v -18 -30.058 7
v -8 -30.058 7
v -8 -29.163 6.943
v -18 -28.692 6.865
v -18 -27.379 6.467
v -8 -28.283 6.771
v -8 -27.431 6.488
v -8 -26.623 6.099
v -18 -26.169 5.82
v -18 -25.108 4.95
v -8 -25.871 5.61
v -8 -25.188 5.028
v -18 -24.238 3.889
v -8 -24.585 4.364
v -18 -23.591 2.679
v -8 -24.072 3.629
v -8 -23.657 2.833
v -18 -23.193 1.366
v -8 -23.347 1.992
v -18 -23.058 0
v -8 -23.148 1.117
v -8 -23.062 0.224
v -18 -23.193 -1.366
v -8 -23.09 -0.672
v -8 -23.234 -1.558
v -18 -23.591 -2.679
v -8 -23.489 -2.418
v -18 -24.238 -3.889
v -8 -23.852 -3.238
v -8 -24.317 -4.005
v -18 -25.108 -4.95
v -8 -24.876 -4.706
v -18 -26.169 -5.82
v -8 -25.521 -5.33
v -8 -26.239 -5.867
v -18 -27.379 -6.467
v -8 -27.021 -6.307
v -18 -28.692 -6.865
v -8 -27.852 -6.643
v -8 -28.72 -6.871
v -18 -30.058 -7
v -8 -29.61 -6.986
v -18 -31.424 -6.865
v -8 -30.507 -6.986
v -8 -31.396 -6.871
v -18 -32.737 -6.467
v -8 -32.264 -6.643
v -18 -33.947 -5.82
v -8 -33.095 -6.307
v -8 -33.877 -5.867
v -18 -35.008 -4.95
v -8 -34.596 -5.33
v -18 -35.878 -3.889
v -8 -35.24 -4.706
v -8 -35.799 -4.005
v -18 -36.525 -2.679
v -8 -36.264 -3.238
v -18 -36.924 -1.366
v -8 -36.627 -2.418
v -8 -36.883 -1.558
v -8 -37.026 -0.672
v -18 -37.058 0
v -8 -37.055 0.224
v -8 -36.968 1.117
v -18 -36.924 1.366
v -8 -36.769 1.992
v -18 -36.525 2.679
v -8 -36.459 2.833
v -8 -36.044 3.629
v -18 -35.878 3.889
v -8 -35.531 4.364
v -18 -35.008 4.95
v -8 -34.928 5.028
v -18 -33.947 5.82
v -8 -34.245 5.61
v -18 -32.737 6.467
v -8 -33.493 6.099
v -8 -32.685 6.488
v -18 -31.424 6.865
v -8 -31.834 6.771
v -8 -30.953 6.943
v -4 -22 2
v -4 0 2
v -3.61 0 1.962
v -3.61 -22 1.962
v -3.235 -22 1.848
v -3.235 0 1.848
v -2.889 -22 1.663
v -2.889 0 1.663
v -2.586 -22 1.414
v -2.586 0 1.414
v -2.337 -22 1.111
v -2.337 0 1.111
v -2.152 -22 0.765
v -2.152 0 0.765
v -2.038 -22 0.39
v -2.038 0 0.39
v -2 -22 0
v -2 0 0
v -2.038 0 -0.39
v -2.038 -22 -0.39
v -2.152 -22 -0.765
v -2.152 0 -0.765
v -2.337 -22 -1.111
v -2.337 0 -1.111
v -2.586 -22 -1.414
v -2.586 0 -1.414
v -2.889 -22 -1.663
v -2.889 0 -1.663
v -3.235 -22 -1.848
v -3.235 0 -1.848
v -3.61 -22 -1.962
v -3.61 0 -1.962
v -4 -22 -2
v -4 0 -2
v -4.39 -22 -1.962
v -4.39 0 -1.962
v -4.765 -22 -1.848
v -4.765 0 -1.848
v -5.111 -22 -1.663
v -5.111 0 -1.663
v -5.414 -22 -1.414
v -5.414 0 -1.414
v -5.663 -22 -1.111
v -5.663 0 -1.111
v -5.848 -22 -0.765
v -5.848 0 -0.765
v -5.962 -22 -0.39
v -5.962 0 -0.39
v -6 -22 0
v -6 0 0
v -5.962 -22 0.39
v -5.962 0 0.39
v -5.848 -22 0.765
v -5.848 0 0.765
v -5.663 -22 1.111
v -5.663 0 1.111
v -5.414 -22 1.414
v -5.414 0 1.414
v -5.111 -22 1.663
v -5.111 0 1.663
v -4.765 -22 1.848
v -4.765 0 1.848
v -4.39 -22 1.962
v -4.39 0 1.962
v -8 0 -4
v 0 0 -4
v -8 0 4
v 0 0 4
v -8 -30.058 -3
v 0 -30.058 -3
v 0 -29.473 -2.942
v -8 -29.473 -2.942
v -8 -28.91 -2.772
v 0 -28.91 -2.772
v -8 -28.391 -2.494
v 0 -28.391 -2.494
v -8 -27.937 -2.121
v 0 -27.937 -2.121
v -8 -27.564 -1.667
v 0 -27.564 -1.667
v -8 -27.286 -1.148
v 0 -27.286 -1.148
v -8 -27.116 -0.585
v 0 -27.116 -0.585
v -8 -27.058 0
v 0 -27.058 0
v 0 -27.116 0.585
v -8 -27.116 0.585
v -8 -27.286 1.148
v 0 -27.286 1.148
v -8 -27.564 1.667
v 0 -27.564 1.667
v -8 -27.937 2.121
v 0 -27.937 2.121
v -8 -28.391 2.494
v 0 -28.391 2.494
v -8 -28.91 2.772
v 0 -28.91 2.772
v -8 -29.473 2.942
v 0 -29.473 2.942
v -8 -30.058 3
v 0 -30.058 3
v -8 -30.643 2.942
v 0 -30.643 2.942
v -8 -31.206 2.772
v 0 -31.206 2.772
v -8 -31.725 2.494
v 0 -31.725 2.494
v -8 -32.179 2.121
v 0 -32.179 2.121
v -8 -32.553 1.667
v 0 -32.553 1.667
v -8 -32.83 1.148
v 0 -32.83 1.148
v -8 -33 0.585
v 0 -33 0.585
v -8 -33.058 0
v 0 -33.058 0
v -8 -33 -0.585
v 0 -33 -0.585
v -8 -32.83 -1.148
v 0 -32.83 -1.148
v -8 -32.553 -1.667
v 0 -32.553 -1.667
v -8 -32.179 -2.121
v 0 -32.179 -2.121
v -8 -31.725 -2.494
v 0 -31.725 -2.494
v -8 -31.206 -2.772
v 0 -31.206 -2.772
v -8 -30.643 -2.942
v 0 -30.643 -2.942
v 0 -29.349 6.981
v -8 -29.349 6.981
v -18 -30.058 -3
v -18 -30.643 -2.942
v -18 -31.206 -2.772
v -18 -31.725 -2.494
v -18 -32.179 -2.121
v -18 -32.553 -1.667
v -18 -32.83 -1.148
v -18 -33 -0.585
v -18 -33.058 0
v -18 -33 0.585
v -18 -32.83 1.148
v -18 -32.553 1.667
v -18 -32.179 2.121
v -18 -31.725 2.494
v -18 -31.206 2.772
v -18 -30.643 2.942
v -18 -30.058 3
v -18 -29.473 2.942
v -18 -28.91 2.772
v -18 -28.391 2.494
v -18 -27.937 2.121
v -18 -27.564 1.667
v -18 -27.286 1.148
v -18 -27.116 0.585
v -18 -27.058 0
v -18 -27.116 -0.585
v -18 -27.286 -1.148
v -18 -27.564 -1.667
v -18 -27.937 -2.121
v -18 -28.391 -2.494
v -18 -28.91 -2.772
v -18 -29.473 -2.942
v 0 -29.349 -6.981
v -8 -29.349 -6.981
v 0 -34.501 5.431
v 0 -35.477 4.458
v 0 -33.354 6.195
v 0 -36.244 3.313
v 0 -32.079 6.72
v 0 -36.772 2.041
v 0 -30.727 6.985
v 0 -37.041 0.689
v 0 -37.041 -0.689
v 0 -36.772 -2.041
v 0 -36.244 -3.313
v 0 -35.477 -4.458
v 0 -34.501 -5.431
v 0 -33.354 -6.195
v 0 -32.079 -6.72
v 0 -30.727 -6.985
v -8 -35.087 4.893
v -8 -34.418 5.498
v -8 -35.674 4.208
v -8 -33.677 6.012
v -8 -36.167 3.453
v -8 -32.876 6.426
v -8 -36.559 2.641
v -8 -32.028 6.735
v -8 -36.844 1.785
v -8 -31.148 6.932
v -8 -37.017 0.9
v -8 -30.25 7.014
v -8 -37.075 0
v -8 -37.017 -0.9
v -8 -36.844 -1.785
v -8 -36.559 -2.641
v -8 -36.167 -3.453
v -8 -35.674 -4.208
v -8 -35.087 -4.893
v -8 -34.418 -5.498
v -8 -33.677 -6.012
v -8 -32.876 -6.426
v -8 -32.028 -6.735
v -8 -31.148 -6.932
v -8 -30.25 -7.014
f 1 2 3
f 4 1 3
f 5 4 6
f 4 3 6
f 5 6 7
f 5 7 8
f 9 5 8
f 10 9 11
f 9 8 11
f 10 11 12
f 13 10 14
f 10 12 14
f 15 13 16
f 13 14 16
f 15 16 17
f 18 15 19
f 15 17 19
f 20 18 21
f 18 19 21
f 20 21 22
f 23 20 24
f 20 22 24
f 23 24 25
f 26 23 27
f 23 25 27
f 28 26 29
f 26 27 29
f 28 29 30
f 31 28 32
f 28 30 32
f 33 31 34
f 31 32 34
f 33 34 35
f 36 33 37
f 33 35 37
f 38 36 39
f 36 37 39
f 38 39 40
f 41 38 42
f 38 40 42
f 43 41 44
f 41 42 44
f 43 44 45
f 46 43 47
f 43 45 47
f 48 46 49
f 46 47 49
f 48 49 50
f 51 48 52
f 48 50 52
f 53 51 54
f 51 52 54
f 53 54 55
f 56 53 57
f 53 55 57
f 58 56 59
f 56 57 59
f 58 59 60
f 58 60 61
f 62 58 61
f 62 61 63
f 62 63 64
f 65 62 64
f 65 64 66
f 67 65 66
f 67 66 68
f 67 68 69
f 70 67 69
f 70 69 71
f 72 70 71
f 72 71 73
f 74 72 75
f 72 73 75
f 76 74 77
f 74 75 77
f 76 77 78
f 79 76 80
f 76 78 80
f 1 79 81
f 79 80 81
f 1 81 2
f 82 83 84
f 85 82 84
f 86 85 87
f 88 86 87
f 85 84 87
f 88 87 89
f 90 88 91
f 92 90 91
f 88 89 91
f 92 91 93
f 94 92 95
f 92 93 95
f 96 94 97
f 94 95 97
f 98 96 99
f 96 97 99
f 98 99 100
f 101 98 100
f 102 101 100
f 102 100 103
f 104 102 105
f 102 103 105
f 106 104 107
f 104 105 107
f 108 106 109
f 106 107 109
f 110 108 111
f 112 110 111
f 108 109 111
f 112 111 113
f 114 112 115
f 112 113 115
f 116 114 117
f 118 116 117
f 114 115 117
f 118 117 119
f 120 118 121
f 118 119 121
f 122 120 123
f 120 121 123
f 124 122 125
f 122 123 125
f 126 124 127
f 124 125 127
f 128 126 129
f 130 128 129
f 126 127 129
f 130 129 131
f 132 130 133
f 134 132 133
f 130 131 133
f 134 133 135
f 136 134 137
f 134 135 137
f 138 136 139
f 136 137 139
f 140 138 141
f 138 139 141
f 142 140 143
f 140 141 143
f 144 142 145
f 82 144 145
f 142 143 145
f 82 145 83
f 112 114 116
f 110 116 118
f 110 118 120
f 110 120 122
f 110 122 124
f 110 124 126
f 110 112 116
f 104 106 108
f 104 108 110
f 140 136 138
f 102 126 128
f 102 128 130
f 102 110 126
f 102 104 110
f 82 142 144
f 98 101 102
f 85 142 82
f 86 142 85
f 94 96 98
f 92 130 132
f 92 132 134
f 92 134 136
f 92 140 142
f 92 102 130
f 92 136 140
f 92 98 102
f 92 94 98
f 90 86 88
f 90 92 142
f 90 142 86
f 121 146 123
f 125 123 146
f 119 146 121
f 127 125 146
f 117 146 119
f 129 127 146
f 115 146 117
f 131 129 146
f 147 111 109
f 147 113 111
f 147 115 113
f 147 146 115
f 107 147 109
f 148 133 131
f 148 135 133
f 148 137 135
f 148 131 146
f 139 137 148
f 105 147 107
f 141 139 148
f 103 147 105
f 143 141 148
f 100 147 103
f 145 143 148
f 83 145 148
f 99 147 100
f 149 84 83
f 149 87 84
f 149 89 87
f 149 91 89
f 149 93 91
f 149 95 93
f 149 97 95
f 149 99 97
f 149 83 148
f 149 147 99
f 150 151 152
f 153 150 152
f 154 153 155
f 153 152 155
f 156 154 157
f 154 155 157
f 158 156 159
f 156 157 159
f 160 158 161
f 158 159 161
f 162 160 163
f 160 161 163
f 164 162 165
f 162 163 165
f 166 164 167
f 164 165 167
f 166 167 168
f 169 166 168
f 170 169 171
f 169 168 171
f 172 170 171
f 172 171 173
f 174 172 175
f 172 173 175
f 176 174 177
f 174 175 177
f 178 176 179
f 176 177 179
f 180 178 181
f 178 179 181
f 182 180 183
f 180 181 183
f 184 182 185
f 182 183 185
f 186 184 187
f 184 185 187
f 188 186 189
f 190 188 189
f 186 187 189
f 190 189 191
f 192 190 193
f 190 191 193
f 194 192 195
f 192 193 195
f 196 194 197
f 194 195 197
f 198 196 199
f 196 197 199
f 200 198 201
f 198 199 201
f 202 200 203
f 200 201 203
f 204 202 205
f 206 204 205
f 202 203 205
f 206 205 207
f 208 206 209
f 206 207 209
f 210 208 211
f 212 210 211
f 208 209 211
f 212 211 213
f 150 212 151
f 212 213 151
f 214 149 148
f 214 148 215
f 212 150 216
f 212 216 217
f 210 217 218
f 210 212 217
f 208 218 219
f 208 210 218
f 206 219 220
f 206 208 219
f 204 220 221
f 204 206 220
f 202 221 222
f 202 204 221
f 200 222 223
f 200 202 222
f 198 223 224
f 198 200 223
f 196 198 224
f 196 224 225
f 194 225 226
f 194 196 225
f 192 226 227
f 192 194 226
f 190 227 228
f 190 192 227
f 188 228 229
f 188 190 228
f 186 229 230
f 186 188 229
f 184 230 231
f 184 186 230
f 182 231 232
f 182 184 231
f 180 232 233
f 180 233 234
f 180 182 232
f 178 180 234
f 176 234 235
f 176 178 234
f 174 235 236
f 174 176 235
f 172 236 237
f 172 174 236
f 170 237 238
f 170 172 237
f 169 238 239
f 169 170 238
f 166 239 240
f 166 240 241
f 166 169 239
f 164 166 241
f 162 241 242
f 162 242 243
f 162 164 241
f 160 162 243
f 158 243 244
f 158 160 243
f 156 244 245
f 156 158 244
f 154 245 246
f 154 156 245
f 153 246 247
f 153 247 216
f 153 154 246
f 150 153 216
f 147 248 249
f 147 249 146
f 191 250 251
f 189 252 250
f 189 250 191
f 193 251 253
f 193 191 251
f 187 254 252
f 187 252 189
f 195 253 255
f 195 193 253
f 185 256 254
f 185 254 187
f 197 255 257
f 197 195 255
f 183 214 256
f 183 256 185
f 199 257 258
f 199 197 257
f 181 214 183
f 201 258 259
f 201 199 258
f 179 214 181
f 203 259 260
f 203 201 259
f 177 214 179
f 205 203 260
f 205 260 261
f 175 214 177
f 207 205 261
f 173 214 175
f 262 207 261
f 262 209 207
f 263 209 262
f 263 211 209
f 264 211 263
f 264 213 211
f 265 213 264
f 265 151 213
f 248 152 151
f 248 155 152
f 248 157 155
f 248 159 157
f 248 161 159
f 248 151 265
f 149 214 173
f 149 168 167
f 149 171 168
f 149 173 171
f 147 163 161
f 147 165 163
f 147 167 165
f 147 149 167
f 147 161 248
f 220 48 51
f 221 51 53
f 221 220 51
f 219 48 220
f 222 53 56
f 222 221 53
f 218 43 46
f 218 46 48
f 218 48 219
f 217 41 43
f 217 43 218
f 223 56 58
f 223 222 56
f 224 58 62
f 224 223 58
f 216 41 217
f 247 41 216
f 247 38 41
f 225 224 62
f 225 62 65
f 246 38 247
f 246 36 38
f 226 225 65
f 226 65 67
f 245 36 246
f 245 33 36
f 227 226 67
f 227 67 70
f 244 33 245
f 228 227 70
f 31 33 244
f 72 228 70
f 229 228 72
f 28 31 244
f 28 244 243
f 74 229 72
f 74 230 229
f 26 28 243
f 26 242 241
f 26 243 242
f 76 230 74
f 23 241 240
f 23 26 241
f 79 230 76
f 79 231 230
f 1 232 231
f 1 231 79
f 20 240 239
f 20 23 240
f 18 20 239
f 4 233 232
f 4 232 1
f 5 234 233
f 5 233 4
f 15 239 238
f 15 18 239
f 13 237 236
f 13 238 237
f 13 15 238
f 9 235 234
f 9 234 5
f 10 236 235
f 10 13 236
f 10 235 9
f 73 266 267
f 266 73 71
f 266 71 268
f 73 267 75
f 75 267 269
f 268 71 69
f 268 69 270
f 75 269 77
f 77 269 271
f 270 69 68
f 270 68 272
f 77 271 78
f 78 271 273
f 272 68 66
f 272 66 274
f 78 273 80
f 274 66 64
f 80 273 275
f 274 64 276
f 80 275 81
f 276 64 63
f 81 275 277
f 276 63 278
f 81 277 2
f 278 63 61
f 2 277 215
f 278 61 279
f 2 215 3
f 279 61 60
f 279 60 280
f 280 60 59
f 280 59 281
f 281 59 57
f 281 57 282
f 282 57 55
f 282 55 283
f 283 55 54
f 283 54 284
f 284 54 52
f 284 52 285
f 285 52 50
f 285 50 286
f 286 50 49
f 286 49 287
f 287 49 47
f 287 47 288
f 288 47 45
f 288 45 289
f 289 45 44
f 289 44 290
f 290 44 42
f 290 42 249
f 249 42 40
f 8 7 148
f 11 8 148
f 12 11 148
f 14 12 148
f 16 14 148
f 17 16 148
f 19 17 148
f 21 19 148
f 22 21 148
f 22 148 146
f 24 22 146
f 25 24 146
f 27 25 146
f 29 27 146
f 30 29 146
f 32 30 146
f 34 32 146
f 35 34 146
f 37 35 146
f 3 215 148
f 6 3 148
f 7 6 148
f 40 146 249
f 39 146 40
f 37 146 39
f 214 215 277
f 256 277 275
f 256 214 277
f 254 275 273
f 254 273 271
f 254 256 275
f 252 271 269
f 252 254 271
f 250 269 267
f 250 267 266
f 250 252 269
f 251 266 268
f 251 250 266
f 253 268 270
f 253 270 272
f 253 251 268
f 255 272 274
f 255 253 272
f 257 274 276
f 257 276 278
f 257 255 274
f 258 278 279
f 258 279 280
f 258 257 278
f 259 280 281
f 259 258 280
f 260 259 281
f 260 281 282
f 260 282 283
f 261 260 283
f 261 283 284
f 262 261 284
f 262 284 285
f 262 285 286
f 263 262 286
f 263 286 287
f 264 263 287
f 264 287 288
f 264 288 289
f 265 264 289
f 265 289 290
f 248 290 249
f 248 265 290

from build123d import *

# Parameters (mm, degrees)
SKETCH1_R           = 3
BOSS_EXTRUDE1_DEPTH = 8
SKETCH2_R           = 7
SKETCH2_R_2         = 3
BOSS_EXTRUDE2_DEPTH = 10
SKETCH3_R           = 2
CUT_EXTRUDE1_DEPTH  = 22


with BuildPart() as part:
    # Sketch1 → Boss-Extrude1 (new body)
    with BuildSketch(Plane(origin=(0, 0, 0), x_dir=(0, 0, -1), z_dir=(1, 0, 0))):
        with BuildLine():
            Line((-4, 0), (-6.981160767, -29.34898091))
            ThreePointArc((-6.981160767, -29.34898091), (0, -37.075184621), (6.981160767, -29.34898091))
            Line((6.981160767, -29.34898091), (4, 0))
            Line((4, 0), (-4, 0))
        make_face()
        with Locations((0, -30.058101362)):
            Circle(SKETCH1_R, mode=Mode.SUBTRACT)
    extrude(amount=-BOSS_EXTRUDE1_DEPTH)

    # Sketch2 → Boss-Extrude2 (add)
    with BuildSketch(Plane.ZY.offset(8)):
        with Locations((0, -30.058101362)):
            Circle(SKETCH2_R)
        with Locations(Location((0, -30.058101362, 0), (0, 0, 180))):
            Circle(SKETCH2_R_2, mode=Mode.SUBTRACT)
    extrude(amount=BOSS_EXTRUDE2_DEPTH)

    # Sketch3 → Cut-Extrude1 (cut)
    with BuildSketch(Plane(origin=(0, 0, 0), x_dir=(1, 0, 0), z_dir=(0, 1, 0))):
        with Locations(Location((-4, 0, 0), (0, 0, 270))):
            Circle(SKETCH3_R)
    extrude(amount=-CUT_EXTRUDE1_DEPTH, mode=Mode.SUBTRACT)


solid = part.part
